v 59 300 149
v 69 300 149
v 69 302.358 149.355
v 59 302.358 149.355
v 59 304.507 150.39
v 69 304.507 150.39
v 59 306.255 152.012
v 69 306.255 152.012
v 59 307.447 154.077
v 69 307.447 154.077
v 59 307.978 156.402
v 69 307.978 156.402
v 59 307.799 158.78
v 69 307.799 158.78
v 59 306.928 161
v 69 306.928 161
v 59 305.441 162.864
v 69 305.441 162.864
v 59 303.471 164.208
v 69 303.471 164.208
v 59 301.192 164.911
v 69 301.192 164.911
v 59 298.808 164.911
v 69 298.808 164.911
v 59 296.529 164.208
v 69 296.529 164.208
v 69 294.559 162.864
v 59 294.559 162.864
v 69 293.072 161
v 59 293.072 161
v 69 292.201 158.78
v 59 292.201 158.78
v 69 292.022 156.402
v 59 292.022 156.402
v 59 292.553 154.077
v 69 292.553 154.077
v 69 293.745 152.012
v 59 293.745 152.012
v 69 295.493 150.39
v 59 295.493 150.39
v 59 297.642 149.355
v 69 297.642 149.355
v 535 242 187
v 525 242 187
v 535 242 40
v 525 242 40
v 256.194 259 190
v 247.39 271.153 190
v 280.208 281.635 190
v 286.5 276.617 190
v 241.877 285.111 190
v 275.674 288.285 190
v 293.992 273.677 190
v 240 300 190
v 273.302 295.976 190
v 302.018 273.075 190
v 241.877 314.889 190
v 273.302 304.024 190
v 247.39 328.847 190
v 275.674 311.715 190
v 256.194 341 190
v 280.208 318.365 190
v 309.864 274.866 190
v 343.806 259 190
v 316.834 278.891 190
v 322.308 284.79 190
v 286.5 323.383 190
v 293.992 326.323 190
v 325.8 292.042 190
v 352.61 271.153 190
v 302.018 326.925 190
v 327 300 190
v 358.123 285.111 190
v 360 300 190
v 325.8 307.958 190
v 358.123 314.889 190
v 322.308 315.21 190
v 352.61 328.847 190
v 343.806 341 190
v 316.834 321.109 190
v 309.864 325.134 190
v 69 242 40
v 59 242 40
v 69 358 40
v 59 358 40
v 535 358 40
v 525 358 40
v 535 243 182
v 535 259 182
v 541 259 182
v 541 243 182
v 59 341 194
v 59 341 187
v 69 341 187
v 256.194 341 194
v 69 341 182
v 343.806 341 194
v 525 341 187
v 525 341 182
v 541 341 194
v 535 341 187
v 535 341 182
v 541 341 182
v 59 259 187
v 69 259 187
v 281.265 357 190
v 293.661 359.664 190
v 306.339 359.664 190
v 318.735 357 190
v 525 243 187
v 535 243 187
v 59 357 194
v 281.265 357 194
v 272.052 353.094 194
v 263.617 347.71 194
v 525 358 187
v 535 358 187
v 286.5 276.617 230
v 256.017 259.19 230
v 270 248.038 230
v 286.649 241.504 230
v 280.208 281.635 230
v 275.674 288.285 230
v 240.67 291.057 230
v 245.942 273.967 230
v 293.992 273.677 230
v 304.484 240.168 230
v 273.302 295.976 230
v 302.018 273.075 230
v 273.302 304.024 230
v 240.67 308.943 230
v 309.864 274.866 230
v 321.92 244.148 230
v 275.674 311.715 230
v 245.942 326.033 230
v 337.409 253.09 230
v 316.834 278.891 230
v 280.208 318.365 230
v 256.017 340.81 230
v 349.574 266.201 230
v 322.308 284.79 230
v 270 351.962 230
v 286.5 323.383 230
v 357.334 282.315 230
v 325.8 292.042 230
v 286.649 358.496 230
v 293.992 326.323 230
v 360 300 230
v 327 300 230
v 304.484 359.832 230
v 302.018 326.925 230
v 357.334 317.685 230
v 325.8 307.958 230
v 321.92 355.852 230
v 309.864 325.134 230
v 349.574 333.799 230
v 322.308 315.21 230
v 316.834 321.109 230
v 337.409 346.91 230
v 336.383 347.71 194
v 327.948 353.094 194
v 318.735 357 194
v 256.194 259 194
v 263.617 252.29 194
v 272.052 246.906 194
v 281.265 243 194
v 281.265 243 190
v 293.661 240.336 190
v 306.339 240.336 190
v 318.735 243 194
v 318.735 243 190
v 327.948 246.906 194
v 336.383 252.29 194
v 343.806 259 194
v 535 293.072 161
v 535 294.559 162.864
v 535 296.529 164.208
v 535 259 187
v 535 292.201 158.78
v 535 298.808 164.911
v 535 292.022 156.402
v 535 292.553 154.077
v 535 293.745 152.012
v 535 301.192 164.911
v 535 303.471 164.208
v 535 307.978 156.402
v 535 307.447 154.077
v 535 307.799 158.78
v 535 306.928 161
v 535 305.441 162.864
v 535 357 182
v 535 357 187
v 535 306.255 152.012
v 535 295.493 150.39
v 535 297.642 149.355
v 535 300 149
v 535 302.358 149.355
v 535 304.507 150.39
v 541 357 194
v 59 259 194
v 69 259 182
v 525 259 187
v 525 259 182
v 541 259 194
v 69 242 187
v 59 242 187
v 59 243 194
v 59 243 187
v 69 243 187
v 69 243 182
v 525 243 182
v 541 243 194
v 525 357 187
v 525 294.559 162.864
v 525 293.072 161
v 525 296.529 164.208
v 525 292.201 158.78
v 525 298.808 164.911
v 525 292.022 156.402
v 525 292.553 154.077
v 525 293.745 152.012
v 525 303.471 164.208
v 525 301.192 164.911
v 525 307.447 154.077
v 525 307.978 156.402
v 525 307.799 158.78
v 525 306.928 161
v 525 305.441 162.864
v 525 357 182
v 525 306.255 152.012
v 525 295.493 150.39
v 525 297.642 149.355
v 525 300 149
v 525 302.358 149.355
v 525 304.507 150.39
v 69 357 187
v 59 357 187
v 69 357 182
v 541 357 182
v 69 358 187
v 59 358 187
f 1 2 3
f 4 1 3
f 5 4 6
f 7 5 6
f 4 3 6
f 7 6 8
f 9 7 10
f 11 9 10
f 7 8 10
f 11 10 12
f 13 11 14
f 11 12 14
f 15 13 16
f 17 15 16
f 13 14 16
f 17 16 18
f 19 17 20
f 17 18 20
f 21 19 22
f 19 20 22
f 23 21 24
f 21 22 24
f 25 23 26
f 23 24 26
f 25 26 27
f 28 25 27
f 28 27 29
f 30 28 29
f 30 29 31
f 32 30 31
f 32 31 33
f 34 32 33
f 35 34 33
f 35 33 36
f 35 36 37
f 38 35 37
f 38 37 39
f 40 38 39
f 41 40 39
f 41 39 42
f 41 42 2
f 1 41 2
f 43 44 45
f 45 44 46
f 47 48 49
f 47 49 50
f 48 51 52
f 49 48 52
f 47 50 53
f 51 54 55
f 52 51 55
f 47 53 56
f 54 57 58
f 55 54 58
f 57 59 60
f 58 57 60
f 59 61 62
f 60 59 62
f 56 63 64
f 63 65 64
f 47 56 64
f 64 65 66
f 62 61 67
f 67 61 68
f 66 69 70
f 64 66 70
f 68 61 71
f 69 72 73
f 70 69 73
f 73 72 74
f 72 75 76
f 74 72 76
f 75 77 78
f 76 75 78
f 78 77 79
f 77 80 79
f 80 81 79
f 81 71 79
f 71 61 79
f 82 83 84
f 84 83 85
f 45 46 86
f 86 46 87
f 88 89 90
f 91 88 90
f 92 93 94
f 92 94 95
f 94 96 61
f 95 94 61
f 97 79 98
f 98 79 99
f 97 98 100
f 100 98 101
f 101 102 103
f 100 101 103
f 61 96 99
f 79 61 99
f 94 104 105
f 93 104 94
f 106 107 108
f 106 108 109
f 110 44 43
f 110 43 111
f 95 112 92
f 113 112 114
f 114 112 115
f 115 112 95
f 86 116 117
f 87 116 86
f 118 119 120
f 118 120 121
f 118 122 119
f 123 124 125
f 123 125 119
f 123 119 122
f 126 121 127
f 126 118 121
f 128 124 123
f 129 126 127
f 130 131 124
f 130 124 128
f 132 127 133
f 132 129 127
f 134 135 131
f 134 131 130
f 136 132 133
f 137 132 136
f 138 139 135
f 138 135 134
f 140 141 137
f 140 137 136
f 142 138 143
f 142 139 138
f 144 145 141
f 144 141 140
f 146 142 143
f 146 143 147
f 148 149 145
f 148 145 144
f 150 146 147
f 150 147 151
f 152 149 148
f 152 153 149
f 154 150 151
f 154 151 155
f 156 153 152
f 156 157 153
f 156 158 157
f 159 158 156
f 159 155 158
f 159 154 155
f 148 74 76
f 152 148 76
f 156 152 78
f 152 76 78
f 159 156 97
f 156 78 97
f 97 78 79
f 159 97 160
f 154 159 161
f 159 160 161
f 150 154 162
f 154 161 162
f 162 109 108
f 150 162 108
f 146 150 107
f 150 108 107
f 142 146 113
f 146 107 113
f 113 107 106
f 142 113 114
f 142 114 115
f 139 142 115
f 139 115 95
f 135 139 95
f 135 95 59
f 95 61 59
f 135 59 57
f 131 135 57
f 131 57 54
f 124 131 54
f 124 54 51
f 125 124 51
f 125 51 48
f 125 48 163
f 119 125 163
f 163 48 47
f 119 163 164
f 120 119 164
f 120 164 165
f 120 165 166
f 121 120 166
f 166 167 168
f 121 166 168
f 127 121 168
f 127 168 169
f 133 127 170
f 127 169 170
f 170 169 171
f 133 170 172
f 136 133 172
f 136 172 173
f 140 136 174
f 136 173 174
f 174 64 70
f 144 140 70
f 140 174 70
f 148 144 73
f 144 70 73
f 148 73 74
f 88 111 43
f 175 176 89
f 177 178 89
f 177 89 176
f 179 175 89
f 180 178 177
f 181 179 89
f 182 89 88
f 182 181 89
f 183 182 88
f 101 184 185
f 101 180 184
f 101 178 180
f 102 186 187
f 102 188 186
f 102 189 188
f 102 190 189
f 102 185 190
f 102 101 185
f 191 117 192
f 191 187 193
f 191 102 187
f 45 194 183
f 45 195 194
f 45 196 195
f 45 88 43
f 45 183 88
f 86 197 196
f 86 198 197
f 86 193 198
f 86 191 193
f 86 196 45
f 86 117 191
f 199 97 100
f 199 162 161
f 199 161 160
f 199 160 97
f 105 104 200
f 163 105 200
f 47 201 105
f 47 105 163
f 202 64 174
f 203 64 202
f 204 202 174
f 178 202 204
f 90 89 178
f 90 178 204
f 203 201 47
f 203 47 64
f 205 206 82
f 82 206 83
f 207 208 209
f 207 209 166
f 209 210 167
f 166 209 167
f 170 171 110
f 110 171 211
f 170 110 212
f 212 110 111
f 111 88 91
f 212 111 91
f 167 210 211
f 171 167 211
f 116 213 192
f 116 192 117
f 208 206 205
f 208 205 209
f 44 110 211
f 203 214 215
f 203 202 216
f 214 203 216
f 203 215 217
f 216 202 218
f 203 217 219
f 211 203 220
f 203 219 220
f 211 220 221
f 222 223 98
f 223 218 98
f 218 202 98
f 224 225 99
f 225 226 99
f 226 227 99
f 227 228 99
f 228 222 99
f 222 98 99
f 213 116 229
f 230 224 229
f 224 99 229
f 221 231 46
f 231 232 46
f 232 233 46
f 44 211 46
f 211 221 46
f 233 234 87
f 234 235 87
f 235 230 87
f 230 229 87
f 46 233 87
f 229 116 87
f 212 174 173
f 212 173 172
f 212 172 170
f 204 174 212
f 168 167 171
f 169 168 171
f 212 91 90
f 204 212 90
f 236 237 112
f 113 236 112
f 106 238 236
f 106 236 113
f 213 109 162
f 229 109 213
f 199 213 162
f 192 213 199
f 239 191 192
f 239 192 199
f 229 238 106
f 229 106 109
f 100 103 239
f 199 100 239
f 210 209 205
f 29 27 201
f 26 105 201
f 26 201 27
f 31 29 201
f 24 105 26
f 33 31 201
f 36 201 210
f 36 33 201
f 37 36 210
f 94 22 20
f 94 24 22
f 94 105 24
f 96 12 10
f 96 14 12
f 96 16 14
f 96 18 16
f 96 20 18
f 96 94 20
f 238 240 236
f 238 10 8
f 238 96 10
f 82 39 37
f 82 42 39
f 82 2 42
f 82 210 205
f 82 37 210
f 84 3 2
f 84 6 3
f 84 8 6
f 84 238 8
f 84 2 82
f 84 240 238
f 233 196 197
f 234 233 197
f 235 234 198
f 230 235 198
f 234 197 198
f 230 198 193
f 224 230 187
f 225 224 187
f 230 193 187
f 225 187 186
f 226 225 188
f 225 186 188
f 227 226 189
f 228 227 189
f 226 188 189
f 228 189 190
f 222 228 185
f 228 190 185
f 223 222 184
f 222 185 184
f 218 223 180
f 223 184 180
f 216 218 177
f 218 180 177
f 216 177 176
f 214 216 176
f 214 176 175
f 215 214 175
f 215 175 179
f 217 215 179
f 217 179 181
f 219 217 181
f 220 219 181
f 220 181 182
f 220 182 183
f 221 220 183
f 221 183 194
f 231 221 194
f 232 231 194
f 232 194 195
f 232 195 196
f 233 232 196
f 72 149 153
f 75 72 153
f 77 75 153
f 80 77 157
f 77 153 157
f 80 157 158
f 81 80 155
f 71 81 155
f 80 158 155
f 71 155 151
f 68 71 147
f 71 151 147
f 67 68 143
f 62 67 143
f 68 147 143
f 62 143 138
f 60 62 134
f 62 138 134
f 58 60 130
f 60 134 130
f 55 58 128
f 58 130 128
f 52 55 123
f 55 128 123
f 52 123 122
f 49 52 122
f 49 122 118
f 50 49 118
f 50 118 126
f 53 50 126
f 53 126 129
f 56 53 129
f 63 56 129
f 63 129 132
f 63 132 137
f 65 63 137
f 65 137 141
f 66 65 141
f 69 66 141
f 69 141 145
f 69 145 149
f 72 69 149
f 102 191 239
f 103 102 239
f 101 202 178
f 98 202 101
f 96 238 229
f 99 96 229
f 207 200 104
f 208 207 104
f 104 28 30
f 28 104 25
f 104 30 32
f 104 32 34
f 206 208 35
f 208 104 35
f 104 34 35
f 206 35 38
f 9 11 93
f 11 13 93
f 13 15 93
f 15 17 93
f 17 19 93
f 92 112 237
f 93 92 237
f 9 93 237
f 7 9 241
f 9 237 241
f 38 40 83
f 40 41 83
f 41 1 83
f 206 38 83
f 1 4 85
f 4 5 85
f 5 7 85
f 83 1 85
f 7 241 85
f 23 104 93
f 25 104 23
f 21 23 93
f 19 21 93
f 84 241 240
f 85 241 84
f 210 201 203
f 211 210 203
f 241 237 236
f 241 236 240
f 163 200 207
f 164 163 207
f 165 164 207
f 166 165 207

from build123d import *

# Parameters (mm, degrees)
SKETCH1_R           = 60
BOSS_EXTRUDE1_DEPTH = 40
SKETCH2_W           = 482
SKETCH2_H           = 16
BOSS_EXTRUDE2_DEPTH = 12
SKETCH3_W           = 482
SKETCH3_H           = 16
BOSS_EXTRUDE3_DEPTH = 12
SKETCH4_W           = 147
SKETCH4_H           = 116
BOSS_EXTRUDE4_DEPTH = 10
SKETCH5_W           = 147
SKETCH5_H           = 116
BOSS_EXTRUDE5_DEPTH = 10
SKETCH6_R           = 27
CUT_EXTRUDE1_DEPTH  = 210
SKETCH7_R           = 8
CUT_EXTRUDE2_DEPTH  = 502


with BuildPart() as part:
    # Sketch1 → Boss-Extrude1 (new body)
    with BuildSketch(Plane.XY.offset(190)):
        with Locations((300, 300)):
            Circle(SKETCH1_R)
    extrude(amount=BOSS_EXTRUDE1_DEPTH)

    # Sketch2 → Boss-Extrude2 (add)
    with BuildSketch(Plane.XY.offset(182)):
        with Locations((300, 349)):
            Rectangle(SKETCH2_W, SKETCH2_H)
    extrude(amount=BOSS_EXTRUDE2_DEPTH)

    # Sketch3 → Boss-Extrude3 (add)
    with BuildSketch(Plane.XY.offset(182)):
        with Locations((300, 251)):
            Rectangle(SKETCH3_W, SKETCH3_H)
    extrude(amount=BOSS_EXTRUDE3_DEPTH)

    # Sketch4 → Boss-Extrude4 (add)
    with BuildSketch(Plane(origin=(525, 0, 0), x_dir=(0, 0, -1), z_dir=(1, 0, 0))):
        with Locations((-113.5, 300)):
            Rectangle(SKETCH4_W, SKETCH4_H)
    extrude(amount=BOSS_EXTRUDE4_DEPTH)

    # Sketch5 → Boss-Extrude5 (add)
    with BuildSketch(Plane(origin=(59, 0, 0), x_dir=(0, 0, -1), z_dir=(1, 0, 0))):
        with Locations((-113.5, 300)):
            Rectangle(SKETCH5_W, SKETCH5_H)
    extrude(amount=BOSS_EXTRUDE5_DEPTH)

    # Sketch6 → Cut-Extrude1 (cut)
    with BuildSketch(Plane.XY.offset(230)):
        with Locations((300, 300)):
            Circle(SKETCH6_R)
    extrude(amount=-CUT_EXTRUDE1_DEPTH, mode=Mode.SUBTRACT)

    # Sketch7 → Cut-Extrude2 (cut)
    with BuildSketch(Plane(origin=(535, 0, 0), x_dir=(0, 0, -1), z_dir=(1, 0, 0))):
        with Locations((-157, 300)):
            Circle(SKETCH7_R)
    extrude(amount=-CUT_EXTRUDE2_DEPTH, mode=Mode.SUBTRACT)


solid = part.part
